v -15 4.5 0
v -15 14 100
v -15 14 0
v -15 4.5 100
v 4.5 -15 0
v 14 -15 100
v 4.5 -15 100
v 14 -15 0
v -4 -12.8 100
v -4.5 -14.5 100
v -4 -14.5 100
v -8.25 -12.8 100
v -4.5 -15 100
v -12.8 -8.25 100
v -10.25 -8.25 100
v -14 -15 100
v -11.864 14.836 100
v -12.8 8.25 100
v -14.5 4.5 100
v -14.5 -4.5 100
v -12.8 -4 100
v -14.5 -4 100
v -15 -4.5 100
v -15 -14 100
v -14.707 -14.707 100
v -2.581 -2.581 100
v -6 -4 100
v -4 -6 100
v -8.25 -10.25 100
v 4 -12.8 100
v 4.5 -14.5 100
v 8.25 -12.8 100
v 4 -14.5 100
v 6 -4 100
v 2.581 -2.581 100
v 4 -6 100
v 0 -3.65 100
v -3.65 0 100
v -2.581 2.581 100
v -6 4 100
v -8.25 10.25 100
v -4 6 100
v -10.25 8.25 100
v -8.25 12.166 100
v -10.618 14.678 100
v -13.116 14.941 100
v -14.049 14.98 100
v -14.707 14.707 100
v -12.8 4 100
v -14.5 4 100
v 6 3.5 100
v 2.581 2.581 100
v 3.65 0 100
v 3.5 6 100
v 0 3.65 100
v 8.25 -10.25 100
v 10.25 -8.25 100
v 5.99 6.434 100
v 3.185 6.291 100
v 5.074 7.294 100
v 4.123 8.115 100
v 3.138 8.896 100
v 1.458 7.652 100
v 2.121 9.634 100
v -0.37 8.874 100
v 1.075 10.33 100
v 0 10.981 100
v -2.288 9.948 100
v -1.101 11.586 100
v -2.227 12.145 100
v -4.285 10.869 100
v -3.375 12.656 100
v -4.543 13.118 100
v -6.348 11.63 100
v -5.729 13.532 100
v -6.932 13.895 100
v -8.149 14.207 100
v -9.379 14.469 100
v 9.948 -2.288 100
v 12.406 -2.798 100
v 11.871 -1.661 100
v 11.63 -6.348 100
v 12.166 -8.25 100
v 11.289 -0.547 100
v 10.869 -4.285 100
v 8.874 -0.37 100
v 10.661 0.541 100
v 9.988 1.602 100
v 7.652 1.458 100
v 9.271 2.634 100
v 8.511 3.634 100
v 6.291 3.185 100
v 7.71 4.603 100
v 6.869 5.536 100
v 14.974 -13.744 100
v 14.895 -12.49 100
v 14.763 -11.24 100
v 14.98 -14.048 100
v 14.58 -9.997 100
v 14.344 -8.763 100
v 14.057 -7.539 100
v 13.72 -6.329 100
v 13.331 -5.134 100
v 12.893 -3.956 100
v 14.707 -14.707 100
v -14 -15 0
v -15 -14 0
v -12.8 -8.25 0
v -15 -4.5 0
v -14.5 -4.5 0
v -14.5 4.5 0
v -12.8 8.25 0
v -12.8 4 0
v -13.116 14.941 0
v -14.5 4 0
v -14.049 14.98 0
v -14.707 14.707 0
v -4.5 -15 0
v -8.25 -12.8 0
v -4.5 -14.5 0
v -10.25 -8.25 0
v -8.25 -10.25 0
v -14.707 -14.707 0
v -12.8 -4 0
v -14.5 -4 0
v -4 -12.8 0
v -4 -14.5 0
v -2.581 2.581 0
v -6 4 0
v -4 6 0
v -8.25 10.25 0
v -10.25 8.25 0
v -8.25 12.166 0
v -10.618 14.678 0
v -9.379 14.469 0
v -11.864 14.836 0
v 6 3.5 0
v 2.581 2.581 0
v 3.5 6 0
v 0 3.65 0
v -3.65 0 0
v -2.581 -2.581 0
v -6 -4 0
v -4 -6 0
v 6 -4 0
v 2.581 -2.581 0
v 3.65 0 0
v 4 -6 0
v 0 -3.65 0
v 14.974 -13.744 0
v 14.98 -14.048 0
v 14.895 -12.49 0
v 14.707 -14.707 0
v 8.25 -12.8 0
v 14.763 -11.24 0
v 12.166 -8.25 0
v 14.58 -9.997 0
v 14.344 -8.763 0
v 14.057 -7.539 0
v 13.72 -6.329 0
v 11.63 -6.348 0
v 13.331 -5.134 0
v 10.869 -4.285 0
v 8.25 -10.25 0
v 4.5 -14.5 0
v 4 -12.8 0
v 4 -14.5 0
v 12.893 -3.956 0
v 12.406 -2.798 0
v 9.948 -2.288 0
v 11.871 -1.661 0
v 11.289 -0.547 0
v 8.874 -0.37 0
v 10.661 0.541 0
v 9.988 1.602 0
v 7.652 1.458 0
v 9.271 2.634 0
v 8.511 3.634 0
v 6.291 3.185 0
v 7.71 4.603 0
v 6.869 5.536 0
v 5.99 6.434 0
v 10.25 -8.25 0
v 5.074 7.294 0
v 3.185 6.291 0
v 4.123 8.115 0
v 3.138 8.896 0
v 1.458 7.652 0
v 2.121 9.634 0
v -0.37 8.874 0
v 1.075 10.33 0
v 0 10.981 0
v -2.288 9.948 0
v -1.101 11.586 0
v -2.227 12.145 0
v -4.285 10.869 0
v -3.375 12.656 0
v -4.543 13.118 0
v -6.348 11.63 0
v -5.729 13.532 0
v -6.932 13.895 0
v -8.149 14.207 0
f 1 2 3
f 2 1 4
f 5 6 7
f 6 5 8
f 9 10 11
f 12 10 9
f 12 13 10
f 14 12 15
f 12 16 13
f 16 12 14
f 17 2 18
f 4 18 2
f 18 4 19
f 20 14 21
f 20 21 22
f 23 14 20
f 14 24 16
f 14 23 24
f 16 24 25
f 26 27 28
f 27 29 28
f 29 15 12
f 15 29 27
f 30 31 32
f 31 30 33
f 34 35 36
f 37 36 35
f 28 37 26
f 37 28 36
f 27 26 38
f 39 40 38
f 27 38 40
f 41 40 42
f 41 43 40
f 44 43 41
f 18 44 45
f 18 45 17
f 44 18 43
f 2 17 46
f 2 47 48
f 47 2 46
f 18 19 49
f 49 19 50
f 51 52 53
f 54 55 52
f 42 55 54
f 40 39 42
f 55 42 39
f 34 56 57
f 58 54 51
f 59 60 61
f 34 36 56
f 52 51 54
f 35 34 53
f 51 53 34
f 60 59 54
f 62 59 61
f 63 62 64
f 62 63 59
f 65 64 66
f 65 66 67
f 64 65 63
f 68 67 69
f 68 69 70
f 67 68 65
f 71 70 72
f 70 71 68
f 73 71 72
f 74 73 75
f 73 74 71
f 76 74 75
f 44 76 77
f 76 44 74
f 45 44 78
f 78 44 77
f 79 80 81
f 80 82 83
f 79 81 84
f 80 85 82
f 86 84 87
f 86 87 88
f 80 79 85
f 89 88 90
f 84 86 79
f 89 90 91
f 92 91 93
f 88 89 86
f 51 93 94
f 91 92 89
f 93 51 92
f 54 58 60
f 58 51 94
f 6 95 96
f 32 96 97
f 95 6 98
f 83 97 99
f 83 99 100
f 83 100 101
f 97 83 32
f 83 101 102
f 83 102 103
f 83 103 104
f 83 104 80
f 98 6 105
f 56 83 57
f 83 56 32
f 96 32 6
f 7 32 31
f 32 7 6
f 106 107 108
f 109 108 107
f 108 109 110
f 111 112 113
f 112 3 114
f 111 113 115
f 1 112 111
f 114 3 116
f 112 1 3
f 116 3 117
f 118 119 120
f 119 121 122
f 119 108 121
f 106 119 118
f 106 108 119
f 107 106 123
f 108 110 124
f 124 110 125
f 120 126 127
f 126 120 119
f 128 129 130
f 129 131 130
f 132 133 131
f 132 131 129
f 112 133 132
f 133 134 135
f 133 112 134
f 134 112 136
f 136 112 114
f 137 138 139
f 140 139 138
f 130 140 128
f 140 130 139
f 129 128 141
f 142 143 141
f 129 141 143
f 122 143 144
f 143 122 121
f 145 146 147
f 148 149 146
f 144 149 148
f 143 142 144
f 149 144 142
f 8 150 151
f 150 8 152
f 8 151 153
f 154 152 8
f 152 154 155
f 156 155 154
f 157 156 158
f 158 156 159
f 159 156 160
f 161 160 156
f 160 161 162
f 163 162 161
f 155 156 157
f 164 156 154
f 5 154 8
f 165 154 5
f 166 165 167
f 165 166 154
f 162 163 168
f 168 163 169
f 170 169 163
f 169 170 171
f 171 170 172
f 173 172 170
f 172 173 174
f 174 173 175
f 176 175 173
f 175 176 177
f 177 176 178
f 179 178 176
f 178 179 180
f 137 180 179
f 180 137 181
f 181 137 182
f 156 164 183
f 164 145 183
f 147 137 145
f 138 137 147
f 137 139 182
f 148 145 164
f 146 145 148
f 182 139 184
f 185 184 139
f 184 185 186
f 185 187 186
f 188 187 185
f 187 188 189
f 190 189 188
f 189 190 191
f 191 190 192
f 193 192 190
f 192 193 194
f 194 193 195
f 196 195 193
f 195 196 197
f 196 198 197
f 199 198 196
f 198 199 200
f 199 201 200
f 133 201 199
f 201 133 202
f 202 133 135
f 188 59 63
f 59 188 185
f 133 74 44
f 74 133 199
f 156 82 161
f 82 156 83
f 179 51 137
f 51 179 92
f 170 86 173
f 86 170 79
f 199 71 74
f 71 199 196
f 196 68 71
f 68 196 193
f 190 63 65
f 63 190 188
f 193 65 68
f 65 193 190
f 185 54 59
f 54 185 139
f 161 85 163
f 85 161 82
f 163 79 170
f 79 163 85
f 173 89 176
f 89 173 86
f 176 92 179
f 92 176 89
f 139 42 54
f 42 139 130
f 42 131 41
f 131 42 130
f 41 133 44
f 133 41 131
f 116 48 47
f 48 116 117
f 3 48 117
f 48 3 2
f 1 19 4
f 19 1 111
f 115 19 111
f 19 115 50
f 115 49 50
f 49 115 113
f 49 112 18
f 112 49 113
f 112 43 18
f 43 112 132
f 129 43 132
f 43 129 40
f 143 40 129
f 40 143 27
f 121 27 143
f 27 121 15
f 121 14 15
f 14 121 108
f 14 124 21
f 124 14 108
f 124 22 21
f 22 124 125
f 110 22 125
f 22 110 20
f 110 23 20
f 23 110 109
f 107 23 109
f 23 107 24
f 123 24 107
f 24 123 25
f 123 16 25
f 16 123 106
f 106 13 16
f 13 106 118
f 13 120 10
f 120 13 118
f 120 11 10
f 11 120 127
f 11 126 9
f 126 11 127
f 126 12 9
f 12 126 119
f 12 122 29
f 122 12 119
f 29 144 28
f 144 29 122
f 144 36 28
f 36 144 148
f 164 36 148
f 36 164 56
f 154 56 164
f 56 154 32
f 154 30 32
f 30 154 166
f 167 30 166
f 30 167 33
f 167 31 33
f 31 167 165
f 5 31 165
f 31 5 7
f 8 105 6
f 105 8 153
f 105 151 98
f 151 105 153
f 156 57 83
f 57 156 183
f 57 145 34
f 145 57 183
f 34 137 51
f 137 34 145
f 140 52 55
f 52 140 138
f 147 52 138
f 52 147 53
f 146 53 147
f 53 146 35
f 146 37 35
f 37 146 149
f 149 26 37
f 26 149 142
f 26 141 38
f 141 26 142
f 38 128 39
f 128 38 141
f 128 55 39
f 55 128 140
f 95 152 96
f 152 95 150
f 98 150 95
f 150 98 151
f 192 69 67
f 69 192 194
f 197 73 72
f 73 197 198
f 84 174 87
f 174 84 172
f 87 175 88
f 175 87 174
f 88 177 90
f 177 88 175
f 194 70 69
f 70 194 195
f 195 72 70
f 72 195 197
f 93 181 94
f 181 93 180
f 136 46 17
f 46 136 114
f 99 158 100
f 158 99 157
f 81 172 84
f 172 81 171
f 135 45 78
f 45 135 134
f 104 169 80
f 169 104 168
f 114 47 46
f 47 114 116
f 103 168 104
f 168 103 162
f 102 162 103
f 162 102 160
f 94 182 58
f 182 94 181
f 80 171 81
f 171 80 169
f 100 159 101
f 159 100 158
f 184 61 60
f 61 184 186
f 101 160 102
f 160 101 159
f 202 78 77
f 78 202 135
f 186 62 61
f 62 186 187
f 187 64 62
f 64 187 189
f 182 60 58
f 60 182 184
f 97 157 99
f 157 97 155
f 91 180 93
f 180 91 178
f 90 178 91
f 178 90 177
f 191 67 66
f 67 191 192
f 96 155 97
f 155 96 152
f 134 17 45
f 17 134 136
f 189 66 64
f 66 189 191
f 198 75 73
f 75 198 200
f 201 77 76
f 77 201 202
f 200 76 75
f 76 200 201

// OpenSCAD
// Aleksandr Saechnikov 09 june 2015
ALU_profile_R(height=100, size=30);

module ALU_profile_R(size=30, height=10, radius=1, step=0.5) {

    difference() {
        union() {
            linear_extrude(height=height) {
                union() {
                    sub_extrusion_profile(size, radius, step);
                    rotate([0,0,90])  sub_extrusion_profile(size, radius, step);
                    rotate([0,0,180]) sub_extrusion_profile(size, radius, step);
                    rotate([0,0,270]) sub_extrusion_profile(size, radius, step);
                }
            }
            difference() {
                intersection() {
                    translate([0, 0, height/4])
                        minkowski() {
                            cube([size-radius*2, size-radius*2, height/2], center=true);
                            cylinder(r=radius, h=height/2, $fn=4);
                        }
                    cylinder(r=size, h=height, $fn=100);
                }
                translate([-size/2, -size/2, 0])
                    cylinder(r=size-2, h=height, $fn=80);
            }
        }

        difference() {
            translate([-size/2, -size/2, 0])
                cylinder(r=size*2, h=height, $fn=50);
            translate([-size/2, -size/2, -height/2])
                cylinder(r=size, h=height*2, $fn=150);
        }
    }
    
    
    module sub_extrusion_profile(size=30, radius = 1.5, step=0.5) {

        reSize = size/30; // Scalling

        k0 = 0;
        k2 = 3.65*reSize;
        k1 = k2*cos(45);

        k3 = 4*reSize;
        k4 = 6*reSize;
        k5 = 8.25*reSize; k5_2 = k5 + k4 - k3;
        k6 = 12.8*reSize;
        k7 = 15*reSize;

        _radius = radius;// OR  *reSize -- Corner radius
        _step = step;    // OR  *reSize -- Step size

        polygon(points=[
            [k1,k1],[0,k2], // Center hole
            [0,k4],[k3,k4],[k5,k5_2],[k5,k6],[k3,k6],
            [k3,k7-_step],[k3+_step,k7-_step],[k3+_step,k7], //Step
            [k7-_radius,k7],[k7-_radius*(1.-cos(45)),k7-_radius*(1.-cos(45))],[k7,k7-_radius],// Corner
            [k7,k3+_step],[k7-_step,k3+_step],[k7-_step,k3], // Step
            [k6,k3],[k6,k5],[k5_2,k5],[k4,k3],[k4,0],
            [k2,0]  // Center hole
        ]);
    }
}
